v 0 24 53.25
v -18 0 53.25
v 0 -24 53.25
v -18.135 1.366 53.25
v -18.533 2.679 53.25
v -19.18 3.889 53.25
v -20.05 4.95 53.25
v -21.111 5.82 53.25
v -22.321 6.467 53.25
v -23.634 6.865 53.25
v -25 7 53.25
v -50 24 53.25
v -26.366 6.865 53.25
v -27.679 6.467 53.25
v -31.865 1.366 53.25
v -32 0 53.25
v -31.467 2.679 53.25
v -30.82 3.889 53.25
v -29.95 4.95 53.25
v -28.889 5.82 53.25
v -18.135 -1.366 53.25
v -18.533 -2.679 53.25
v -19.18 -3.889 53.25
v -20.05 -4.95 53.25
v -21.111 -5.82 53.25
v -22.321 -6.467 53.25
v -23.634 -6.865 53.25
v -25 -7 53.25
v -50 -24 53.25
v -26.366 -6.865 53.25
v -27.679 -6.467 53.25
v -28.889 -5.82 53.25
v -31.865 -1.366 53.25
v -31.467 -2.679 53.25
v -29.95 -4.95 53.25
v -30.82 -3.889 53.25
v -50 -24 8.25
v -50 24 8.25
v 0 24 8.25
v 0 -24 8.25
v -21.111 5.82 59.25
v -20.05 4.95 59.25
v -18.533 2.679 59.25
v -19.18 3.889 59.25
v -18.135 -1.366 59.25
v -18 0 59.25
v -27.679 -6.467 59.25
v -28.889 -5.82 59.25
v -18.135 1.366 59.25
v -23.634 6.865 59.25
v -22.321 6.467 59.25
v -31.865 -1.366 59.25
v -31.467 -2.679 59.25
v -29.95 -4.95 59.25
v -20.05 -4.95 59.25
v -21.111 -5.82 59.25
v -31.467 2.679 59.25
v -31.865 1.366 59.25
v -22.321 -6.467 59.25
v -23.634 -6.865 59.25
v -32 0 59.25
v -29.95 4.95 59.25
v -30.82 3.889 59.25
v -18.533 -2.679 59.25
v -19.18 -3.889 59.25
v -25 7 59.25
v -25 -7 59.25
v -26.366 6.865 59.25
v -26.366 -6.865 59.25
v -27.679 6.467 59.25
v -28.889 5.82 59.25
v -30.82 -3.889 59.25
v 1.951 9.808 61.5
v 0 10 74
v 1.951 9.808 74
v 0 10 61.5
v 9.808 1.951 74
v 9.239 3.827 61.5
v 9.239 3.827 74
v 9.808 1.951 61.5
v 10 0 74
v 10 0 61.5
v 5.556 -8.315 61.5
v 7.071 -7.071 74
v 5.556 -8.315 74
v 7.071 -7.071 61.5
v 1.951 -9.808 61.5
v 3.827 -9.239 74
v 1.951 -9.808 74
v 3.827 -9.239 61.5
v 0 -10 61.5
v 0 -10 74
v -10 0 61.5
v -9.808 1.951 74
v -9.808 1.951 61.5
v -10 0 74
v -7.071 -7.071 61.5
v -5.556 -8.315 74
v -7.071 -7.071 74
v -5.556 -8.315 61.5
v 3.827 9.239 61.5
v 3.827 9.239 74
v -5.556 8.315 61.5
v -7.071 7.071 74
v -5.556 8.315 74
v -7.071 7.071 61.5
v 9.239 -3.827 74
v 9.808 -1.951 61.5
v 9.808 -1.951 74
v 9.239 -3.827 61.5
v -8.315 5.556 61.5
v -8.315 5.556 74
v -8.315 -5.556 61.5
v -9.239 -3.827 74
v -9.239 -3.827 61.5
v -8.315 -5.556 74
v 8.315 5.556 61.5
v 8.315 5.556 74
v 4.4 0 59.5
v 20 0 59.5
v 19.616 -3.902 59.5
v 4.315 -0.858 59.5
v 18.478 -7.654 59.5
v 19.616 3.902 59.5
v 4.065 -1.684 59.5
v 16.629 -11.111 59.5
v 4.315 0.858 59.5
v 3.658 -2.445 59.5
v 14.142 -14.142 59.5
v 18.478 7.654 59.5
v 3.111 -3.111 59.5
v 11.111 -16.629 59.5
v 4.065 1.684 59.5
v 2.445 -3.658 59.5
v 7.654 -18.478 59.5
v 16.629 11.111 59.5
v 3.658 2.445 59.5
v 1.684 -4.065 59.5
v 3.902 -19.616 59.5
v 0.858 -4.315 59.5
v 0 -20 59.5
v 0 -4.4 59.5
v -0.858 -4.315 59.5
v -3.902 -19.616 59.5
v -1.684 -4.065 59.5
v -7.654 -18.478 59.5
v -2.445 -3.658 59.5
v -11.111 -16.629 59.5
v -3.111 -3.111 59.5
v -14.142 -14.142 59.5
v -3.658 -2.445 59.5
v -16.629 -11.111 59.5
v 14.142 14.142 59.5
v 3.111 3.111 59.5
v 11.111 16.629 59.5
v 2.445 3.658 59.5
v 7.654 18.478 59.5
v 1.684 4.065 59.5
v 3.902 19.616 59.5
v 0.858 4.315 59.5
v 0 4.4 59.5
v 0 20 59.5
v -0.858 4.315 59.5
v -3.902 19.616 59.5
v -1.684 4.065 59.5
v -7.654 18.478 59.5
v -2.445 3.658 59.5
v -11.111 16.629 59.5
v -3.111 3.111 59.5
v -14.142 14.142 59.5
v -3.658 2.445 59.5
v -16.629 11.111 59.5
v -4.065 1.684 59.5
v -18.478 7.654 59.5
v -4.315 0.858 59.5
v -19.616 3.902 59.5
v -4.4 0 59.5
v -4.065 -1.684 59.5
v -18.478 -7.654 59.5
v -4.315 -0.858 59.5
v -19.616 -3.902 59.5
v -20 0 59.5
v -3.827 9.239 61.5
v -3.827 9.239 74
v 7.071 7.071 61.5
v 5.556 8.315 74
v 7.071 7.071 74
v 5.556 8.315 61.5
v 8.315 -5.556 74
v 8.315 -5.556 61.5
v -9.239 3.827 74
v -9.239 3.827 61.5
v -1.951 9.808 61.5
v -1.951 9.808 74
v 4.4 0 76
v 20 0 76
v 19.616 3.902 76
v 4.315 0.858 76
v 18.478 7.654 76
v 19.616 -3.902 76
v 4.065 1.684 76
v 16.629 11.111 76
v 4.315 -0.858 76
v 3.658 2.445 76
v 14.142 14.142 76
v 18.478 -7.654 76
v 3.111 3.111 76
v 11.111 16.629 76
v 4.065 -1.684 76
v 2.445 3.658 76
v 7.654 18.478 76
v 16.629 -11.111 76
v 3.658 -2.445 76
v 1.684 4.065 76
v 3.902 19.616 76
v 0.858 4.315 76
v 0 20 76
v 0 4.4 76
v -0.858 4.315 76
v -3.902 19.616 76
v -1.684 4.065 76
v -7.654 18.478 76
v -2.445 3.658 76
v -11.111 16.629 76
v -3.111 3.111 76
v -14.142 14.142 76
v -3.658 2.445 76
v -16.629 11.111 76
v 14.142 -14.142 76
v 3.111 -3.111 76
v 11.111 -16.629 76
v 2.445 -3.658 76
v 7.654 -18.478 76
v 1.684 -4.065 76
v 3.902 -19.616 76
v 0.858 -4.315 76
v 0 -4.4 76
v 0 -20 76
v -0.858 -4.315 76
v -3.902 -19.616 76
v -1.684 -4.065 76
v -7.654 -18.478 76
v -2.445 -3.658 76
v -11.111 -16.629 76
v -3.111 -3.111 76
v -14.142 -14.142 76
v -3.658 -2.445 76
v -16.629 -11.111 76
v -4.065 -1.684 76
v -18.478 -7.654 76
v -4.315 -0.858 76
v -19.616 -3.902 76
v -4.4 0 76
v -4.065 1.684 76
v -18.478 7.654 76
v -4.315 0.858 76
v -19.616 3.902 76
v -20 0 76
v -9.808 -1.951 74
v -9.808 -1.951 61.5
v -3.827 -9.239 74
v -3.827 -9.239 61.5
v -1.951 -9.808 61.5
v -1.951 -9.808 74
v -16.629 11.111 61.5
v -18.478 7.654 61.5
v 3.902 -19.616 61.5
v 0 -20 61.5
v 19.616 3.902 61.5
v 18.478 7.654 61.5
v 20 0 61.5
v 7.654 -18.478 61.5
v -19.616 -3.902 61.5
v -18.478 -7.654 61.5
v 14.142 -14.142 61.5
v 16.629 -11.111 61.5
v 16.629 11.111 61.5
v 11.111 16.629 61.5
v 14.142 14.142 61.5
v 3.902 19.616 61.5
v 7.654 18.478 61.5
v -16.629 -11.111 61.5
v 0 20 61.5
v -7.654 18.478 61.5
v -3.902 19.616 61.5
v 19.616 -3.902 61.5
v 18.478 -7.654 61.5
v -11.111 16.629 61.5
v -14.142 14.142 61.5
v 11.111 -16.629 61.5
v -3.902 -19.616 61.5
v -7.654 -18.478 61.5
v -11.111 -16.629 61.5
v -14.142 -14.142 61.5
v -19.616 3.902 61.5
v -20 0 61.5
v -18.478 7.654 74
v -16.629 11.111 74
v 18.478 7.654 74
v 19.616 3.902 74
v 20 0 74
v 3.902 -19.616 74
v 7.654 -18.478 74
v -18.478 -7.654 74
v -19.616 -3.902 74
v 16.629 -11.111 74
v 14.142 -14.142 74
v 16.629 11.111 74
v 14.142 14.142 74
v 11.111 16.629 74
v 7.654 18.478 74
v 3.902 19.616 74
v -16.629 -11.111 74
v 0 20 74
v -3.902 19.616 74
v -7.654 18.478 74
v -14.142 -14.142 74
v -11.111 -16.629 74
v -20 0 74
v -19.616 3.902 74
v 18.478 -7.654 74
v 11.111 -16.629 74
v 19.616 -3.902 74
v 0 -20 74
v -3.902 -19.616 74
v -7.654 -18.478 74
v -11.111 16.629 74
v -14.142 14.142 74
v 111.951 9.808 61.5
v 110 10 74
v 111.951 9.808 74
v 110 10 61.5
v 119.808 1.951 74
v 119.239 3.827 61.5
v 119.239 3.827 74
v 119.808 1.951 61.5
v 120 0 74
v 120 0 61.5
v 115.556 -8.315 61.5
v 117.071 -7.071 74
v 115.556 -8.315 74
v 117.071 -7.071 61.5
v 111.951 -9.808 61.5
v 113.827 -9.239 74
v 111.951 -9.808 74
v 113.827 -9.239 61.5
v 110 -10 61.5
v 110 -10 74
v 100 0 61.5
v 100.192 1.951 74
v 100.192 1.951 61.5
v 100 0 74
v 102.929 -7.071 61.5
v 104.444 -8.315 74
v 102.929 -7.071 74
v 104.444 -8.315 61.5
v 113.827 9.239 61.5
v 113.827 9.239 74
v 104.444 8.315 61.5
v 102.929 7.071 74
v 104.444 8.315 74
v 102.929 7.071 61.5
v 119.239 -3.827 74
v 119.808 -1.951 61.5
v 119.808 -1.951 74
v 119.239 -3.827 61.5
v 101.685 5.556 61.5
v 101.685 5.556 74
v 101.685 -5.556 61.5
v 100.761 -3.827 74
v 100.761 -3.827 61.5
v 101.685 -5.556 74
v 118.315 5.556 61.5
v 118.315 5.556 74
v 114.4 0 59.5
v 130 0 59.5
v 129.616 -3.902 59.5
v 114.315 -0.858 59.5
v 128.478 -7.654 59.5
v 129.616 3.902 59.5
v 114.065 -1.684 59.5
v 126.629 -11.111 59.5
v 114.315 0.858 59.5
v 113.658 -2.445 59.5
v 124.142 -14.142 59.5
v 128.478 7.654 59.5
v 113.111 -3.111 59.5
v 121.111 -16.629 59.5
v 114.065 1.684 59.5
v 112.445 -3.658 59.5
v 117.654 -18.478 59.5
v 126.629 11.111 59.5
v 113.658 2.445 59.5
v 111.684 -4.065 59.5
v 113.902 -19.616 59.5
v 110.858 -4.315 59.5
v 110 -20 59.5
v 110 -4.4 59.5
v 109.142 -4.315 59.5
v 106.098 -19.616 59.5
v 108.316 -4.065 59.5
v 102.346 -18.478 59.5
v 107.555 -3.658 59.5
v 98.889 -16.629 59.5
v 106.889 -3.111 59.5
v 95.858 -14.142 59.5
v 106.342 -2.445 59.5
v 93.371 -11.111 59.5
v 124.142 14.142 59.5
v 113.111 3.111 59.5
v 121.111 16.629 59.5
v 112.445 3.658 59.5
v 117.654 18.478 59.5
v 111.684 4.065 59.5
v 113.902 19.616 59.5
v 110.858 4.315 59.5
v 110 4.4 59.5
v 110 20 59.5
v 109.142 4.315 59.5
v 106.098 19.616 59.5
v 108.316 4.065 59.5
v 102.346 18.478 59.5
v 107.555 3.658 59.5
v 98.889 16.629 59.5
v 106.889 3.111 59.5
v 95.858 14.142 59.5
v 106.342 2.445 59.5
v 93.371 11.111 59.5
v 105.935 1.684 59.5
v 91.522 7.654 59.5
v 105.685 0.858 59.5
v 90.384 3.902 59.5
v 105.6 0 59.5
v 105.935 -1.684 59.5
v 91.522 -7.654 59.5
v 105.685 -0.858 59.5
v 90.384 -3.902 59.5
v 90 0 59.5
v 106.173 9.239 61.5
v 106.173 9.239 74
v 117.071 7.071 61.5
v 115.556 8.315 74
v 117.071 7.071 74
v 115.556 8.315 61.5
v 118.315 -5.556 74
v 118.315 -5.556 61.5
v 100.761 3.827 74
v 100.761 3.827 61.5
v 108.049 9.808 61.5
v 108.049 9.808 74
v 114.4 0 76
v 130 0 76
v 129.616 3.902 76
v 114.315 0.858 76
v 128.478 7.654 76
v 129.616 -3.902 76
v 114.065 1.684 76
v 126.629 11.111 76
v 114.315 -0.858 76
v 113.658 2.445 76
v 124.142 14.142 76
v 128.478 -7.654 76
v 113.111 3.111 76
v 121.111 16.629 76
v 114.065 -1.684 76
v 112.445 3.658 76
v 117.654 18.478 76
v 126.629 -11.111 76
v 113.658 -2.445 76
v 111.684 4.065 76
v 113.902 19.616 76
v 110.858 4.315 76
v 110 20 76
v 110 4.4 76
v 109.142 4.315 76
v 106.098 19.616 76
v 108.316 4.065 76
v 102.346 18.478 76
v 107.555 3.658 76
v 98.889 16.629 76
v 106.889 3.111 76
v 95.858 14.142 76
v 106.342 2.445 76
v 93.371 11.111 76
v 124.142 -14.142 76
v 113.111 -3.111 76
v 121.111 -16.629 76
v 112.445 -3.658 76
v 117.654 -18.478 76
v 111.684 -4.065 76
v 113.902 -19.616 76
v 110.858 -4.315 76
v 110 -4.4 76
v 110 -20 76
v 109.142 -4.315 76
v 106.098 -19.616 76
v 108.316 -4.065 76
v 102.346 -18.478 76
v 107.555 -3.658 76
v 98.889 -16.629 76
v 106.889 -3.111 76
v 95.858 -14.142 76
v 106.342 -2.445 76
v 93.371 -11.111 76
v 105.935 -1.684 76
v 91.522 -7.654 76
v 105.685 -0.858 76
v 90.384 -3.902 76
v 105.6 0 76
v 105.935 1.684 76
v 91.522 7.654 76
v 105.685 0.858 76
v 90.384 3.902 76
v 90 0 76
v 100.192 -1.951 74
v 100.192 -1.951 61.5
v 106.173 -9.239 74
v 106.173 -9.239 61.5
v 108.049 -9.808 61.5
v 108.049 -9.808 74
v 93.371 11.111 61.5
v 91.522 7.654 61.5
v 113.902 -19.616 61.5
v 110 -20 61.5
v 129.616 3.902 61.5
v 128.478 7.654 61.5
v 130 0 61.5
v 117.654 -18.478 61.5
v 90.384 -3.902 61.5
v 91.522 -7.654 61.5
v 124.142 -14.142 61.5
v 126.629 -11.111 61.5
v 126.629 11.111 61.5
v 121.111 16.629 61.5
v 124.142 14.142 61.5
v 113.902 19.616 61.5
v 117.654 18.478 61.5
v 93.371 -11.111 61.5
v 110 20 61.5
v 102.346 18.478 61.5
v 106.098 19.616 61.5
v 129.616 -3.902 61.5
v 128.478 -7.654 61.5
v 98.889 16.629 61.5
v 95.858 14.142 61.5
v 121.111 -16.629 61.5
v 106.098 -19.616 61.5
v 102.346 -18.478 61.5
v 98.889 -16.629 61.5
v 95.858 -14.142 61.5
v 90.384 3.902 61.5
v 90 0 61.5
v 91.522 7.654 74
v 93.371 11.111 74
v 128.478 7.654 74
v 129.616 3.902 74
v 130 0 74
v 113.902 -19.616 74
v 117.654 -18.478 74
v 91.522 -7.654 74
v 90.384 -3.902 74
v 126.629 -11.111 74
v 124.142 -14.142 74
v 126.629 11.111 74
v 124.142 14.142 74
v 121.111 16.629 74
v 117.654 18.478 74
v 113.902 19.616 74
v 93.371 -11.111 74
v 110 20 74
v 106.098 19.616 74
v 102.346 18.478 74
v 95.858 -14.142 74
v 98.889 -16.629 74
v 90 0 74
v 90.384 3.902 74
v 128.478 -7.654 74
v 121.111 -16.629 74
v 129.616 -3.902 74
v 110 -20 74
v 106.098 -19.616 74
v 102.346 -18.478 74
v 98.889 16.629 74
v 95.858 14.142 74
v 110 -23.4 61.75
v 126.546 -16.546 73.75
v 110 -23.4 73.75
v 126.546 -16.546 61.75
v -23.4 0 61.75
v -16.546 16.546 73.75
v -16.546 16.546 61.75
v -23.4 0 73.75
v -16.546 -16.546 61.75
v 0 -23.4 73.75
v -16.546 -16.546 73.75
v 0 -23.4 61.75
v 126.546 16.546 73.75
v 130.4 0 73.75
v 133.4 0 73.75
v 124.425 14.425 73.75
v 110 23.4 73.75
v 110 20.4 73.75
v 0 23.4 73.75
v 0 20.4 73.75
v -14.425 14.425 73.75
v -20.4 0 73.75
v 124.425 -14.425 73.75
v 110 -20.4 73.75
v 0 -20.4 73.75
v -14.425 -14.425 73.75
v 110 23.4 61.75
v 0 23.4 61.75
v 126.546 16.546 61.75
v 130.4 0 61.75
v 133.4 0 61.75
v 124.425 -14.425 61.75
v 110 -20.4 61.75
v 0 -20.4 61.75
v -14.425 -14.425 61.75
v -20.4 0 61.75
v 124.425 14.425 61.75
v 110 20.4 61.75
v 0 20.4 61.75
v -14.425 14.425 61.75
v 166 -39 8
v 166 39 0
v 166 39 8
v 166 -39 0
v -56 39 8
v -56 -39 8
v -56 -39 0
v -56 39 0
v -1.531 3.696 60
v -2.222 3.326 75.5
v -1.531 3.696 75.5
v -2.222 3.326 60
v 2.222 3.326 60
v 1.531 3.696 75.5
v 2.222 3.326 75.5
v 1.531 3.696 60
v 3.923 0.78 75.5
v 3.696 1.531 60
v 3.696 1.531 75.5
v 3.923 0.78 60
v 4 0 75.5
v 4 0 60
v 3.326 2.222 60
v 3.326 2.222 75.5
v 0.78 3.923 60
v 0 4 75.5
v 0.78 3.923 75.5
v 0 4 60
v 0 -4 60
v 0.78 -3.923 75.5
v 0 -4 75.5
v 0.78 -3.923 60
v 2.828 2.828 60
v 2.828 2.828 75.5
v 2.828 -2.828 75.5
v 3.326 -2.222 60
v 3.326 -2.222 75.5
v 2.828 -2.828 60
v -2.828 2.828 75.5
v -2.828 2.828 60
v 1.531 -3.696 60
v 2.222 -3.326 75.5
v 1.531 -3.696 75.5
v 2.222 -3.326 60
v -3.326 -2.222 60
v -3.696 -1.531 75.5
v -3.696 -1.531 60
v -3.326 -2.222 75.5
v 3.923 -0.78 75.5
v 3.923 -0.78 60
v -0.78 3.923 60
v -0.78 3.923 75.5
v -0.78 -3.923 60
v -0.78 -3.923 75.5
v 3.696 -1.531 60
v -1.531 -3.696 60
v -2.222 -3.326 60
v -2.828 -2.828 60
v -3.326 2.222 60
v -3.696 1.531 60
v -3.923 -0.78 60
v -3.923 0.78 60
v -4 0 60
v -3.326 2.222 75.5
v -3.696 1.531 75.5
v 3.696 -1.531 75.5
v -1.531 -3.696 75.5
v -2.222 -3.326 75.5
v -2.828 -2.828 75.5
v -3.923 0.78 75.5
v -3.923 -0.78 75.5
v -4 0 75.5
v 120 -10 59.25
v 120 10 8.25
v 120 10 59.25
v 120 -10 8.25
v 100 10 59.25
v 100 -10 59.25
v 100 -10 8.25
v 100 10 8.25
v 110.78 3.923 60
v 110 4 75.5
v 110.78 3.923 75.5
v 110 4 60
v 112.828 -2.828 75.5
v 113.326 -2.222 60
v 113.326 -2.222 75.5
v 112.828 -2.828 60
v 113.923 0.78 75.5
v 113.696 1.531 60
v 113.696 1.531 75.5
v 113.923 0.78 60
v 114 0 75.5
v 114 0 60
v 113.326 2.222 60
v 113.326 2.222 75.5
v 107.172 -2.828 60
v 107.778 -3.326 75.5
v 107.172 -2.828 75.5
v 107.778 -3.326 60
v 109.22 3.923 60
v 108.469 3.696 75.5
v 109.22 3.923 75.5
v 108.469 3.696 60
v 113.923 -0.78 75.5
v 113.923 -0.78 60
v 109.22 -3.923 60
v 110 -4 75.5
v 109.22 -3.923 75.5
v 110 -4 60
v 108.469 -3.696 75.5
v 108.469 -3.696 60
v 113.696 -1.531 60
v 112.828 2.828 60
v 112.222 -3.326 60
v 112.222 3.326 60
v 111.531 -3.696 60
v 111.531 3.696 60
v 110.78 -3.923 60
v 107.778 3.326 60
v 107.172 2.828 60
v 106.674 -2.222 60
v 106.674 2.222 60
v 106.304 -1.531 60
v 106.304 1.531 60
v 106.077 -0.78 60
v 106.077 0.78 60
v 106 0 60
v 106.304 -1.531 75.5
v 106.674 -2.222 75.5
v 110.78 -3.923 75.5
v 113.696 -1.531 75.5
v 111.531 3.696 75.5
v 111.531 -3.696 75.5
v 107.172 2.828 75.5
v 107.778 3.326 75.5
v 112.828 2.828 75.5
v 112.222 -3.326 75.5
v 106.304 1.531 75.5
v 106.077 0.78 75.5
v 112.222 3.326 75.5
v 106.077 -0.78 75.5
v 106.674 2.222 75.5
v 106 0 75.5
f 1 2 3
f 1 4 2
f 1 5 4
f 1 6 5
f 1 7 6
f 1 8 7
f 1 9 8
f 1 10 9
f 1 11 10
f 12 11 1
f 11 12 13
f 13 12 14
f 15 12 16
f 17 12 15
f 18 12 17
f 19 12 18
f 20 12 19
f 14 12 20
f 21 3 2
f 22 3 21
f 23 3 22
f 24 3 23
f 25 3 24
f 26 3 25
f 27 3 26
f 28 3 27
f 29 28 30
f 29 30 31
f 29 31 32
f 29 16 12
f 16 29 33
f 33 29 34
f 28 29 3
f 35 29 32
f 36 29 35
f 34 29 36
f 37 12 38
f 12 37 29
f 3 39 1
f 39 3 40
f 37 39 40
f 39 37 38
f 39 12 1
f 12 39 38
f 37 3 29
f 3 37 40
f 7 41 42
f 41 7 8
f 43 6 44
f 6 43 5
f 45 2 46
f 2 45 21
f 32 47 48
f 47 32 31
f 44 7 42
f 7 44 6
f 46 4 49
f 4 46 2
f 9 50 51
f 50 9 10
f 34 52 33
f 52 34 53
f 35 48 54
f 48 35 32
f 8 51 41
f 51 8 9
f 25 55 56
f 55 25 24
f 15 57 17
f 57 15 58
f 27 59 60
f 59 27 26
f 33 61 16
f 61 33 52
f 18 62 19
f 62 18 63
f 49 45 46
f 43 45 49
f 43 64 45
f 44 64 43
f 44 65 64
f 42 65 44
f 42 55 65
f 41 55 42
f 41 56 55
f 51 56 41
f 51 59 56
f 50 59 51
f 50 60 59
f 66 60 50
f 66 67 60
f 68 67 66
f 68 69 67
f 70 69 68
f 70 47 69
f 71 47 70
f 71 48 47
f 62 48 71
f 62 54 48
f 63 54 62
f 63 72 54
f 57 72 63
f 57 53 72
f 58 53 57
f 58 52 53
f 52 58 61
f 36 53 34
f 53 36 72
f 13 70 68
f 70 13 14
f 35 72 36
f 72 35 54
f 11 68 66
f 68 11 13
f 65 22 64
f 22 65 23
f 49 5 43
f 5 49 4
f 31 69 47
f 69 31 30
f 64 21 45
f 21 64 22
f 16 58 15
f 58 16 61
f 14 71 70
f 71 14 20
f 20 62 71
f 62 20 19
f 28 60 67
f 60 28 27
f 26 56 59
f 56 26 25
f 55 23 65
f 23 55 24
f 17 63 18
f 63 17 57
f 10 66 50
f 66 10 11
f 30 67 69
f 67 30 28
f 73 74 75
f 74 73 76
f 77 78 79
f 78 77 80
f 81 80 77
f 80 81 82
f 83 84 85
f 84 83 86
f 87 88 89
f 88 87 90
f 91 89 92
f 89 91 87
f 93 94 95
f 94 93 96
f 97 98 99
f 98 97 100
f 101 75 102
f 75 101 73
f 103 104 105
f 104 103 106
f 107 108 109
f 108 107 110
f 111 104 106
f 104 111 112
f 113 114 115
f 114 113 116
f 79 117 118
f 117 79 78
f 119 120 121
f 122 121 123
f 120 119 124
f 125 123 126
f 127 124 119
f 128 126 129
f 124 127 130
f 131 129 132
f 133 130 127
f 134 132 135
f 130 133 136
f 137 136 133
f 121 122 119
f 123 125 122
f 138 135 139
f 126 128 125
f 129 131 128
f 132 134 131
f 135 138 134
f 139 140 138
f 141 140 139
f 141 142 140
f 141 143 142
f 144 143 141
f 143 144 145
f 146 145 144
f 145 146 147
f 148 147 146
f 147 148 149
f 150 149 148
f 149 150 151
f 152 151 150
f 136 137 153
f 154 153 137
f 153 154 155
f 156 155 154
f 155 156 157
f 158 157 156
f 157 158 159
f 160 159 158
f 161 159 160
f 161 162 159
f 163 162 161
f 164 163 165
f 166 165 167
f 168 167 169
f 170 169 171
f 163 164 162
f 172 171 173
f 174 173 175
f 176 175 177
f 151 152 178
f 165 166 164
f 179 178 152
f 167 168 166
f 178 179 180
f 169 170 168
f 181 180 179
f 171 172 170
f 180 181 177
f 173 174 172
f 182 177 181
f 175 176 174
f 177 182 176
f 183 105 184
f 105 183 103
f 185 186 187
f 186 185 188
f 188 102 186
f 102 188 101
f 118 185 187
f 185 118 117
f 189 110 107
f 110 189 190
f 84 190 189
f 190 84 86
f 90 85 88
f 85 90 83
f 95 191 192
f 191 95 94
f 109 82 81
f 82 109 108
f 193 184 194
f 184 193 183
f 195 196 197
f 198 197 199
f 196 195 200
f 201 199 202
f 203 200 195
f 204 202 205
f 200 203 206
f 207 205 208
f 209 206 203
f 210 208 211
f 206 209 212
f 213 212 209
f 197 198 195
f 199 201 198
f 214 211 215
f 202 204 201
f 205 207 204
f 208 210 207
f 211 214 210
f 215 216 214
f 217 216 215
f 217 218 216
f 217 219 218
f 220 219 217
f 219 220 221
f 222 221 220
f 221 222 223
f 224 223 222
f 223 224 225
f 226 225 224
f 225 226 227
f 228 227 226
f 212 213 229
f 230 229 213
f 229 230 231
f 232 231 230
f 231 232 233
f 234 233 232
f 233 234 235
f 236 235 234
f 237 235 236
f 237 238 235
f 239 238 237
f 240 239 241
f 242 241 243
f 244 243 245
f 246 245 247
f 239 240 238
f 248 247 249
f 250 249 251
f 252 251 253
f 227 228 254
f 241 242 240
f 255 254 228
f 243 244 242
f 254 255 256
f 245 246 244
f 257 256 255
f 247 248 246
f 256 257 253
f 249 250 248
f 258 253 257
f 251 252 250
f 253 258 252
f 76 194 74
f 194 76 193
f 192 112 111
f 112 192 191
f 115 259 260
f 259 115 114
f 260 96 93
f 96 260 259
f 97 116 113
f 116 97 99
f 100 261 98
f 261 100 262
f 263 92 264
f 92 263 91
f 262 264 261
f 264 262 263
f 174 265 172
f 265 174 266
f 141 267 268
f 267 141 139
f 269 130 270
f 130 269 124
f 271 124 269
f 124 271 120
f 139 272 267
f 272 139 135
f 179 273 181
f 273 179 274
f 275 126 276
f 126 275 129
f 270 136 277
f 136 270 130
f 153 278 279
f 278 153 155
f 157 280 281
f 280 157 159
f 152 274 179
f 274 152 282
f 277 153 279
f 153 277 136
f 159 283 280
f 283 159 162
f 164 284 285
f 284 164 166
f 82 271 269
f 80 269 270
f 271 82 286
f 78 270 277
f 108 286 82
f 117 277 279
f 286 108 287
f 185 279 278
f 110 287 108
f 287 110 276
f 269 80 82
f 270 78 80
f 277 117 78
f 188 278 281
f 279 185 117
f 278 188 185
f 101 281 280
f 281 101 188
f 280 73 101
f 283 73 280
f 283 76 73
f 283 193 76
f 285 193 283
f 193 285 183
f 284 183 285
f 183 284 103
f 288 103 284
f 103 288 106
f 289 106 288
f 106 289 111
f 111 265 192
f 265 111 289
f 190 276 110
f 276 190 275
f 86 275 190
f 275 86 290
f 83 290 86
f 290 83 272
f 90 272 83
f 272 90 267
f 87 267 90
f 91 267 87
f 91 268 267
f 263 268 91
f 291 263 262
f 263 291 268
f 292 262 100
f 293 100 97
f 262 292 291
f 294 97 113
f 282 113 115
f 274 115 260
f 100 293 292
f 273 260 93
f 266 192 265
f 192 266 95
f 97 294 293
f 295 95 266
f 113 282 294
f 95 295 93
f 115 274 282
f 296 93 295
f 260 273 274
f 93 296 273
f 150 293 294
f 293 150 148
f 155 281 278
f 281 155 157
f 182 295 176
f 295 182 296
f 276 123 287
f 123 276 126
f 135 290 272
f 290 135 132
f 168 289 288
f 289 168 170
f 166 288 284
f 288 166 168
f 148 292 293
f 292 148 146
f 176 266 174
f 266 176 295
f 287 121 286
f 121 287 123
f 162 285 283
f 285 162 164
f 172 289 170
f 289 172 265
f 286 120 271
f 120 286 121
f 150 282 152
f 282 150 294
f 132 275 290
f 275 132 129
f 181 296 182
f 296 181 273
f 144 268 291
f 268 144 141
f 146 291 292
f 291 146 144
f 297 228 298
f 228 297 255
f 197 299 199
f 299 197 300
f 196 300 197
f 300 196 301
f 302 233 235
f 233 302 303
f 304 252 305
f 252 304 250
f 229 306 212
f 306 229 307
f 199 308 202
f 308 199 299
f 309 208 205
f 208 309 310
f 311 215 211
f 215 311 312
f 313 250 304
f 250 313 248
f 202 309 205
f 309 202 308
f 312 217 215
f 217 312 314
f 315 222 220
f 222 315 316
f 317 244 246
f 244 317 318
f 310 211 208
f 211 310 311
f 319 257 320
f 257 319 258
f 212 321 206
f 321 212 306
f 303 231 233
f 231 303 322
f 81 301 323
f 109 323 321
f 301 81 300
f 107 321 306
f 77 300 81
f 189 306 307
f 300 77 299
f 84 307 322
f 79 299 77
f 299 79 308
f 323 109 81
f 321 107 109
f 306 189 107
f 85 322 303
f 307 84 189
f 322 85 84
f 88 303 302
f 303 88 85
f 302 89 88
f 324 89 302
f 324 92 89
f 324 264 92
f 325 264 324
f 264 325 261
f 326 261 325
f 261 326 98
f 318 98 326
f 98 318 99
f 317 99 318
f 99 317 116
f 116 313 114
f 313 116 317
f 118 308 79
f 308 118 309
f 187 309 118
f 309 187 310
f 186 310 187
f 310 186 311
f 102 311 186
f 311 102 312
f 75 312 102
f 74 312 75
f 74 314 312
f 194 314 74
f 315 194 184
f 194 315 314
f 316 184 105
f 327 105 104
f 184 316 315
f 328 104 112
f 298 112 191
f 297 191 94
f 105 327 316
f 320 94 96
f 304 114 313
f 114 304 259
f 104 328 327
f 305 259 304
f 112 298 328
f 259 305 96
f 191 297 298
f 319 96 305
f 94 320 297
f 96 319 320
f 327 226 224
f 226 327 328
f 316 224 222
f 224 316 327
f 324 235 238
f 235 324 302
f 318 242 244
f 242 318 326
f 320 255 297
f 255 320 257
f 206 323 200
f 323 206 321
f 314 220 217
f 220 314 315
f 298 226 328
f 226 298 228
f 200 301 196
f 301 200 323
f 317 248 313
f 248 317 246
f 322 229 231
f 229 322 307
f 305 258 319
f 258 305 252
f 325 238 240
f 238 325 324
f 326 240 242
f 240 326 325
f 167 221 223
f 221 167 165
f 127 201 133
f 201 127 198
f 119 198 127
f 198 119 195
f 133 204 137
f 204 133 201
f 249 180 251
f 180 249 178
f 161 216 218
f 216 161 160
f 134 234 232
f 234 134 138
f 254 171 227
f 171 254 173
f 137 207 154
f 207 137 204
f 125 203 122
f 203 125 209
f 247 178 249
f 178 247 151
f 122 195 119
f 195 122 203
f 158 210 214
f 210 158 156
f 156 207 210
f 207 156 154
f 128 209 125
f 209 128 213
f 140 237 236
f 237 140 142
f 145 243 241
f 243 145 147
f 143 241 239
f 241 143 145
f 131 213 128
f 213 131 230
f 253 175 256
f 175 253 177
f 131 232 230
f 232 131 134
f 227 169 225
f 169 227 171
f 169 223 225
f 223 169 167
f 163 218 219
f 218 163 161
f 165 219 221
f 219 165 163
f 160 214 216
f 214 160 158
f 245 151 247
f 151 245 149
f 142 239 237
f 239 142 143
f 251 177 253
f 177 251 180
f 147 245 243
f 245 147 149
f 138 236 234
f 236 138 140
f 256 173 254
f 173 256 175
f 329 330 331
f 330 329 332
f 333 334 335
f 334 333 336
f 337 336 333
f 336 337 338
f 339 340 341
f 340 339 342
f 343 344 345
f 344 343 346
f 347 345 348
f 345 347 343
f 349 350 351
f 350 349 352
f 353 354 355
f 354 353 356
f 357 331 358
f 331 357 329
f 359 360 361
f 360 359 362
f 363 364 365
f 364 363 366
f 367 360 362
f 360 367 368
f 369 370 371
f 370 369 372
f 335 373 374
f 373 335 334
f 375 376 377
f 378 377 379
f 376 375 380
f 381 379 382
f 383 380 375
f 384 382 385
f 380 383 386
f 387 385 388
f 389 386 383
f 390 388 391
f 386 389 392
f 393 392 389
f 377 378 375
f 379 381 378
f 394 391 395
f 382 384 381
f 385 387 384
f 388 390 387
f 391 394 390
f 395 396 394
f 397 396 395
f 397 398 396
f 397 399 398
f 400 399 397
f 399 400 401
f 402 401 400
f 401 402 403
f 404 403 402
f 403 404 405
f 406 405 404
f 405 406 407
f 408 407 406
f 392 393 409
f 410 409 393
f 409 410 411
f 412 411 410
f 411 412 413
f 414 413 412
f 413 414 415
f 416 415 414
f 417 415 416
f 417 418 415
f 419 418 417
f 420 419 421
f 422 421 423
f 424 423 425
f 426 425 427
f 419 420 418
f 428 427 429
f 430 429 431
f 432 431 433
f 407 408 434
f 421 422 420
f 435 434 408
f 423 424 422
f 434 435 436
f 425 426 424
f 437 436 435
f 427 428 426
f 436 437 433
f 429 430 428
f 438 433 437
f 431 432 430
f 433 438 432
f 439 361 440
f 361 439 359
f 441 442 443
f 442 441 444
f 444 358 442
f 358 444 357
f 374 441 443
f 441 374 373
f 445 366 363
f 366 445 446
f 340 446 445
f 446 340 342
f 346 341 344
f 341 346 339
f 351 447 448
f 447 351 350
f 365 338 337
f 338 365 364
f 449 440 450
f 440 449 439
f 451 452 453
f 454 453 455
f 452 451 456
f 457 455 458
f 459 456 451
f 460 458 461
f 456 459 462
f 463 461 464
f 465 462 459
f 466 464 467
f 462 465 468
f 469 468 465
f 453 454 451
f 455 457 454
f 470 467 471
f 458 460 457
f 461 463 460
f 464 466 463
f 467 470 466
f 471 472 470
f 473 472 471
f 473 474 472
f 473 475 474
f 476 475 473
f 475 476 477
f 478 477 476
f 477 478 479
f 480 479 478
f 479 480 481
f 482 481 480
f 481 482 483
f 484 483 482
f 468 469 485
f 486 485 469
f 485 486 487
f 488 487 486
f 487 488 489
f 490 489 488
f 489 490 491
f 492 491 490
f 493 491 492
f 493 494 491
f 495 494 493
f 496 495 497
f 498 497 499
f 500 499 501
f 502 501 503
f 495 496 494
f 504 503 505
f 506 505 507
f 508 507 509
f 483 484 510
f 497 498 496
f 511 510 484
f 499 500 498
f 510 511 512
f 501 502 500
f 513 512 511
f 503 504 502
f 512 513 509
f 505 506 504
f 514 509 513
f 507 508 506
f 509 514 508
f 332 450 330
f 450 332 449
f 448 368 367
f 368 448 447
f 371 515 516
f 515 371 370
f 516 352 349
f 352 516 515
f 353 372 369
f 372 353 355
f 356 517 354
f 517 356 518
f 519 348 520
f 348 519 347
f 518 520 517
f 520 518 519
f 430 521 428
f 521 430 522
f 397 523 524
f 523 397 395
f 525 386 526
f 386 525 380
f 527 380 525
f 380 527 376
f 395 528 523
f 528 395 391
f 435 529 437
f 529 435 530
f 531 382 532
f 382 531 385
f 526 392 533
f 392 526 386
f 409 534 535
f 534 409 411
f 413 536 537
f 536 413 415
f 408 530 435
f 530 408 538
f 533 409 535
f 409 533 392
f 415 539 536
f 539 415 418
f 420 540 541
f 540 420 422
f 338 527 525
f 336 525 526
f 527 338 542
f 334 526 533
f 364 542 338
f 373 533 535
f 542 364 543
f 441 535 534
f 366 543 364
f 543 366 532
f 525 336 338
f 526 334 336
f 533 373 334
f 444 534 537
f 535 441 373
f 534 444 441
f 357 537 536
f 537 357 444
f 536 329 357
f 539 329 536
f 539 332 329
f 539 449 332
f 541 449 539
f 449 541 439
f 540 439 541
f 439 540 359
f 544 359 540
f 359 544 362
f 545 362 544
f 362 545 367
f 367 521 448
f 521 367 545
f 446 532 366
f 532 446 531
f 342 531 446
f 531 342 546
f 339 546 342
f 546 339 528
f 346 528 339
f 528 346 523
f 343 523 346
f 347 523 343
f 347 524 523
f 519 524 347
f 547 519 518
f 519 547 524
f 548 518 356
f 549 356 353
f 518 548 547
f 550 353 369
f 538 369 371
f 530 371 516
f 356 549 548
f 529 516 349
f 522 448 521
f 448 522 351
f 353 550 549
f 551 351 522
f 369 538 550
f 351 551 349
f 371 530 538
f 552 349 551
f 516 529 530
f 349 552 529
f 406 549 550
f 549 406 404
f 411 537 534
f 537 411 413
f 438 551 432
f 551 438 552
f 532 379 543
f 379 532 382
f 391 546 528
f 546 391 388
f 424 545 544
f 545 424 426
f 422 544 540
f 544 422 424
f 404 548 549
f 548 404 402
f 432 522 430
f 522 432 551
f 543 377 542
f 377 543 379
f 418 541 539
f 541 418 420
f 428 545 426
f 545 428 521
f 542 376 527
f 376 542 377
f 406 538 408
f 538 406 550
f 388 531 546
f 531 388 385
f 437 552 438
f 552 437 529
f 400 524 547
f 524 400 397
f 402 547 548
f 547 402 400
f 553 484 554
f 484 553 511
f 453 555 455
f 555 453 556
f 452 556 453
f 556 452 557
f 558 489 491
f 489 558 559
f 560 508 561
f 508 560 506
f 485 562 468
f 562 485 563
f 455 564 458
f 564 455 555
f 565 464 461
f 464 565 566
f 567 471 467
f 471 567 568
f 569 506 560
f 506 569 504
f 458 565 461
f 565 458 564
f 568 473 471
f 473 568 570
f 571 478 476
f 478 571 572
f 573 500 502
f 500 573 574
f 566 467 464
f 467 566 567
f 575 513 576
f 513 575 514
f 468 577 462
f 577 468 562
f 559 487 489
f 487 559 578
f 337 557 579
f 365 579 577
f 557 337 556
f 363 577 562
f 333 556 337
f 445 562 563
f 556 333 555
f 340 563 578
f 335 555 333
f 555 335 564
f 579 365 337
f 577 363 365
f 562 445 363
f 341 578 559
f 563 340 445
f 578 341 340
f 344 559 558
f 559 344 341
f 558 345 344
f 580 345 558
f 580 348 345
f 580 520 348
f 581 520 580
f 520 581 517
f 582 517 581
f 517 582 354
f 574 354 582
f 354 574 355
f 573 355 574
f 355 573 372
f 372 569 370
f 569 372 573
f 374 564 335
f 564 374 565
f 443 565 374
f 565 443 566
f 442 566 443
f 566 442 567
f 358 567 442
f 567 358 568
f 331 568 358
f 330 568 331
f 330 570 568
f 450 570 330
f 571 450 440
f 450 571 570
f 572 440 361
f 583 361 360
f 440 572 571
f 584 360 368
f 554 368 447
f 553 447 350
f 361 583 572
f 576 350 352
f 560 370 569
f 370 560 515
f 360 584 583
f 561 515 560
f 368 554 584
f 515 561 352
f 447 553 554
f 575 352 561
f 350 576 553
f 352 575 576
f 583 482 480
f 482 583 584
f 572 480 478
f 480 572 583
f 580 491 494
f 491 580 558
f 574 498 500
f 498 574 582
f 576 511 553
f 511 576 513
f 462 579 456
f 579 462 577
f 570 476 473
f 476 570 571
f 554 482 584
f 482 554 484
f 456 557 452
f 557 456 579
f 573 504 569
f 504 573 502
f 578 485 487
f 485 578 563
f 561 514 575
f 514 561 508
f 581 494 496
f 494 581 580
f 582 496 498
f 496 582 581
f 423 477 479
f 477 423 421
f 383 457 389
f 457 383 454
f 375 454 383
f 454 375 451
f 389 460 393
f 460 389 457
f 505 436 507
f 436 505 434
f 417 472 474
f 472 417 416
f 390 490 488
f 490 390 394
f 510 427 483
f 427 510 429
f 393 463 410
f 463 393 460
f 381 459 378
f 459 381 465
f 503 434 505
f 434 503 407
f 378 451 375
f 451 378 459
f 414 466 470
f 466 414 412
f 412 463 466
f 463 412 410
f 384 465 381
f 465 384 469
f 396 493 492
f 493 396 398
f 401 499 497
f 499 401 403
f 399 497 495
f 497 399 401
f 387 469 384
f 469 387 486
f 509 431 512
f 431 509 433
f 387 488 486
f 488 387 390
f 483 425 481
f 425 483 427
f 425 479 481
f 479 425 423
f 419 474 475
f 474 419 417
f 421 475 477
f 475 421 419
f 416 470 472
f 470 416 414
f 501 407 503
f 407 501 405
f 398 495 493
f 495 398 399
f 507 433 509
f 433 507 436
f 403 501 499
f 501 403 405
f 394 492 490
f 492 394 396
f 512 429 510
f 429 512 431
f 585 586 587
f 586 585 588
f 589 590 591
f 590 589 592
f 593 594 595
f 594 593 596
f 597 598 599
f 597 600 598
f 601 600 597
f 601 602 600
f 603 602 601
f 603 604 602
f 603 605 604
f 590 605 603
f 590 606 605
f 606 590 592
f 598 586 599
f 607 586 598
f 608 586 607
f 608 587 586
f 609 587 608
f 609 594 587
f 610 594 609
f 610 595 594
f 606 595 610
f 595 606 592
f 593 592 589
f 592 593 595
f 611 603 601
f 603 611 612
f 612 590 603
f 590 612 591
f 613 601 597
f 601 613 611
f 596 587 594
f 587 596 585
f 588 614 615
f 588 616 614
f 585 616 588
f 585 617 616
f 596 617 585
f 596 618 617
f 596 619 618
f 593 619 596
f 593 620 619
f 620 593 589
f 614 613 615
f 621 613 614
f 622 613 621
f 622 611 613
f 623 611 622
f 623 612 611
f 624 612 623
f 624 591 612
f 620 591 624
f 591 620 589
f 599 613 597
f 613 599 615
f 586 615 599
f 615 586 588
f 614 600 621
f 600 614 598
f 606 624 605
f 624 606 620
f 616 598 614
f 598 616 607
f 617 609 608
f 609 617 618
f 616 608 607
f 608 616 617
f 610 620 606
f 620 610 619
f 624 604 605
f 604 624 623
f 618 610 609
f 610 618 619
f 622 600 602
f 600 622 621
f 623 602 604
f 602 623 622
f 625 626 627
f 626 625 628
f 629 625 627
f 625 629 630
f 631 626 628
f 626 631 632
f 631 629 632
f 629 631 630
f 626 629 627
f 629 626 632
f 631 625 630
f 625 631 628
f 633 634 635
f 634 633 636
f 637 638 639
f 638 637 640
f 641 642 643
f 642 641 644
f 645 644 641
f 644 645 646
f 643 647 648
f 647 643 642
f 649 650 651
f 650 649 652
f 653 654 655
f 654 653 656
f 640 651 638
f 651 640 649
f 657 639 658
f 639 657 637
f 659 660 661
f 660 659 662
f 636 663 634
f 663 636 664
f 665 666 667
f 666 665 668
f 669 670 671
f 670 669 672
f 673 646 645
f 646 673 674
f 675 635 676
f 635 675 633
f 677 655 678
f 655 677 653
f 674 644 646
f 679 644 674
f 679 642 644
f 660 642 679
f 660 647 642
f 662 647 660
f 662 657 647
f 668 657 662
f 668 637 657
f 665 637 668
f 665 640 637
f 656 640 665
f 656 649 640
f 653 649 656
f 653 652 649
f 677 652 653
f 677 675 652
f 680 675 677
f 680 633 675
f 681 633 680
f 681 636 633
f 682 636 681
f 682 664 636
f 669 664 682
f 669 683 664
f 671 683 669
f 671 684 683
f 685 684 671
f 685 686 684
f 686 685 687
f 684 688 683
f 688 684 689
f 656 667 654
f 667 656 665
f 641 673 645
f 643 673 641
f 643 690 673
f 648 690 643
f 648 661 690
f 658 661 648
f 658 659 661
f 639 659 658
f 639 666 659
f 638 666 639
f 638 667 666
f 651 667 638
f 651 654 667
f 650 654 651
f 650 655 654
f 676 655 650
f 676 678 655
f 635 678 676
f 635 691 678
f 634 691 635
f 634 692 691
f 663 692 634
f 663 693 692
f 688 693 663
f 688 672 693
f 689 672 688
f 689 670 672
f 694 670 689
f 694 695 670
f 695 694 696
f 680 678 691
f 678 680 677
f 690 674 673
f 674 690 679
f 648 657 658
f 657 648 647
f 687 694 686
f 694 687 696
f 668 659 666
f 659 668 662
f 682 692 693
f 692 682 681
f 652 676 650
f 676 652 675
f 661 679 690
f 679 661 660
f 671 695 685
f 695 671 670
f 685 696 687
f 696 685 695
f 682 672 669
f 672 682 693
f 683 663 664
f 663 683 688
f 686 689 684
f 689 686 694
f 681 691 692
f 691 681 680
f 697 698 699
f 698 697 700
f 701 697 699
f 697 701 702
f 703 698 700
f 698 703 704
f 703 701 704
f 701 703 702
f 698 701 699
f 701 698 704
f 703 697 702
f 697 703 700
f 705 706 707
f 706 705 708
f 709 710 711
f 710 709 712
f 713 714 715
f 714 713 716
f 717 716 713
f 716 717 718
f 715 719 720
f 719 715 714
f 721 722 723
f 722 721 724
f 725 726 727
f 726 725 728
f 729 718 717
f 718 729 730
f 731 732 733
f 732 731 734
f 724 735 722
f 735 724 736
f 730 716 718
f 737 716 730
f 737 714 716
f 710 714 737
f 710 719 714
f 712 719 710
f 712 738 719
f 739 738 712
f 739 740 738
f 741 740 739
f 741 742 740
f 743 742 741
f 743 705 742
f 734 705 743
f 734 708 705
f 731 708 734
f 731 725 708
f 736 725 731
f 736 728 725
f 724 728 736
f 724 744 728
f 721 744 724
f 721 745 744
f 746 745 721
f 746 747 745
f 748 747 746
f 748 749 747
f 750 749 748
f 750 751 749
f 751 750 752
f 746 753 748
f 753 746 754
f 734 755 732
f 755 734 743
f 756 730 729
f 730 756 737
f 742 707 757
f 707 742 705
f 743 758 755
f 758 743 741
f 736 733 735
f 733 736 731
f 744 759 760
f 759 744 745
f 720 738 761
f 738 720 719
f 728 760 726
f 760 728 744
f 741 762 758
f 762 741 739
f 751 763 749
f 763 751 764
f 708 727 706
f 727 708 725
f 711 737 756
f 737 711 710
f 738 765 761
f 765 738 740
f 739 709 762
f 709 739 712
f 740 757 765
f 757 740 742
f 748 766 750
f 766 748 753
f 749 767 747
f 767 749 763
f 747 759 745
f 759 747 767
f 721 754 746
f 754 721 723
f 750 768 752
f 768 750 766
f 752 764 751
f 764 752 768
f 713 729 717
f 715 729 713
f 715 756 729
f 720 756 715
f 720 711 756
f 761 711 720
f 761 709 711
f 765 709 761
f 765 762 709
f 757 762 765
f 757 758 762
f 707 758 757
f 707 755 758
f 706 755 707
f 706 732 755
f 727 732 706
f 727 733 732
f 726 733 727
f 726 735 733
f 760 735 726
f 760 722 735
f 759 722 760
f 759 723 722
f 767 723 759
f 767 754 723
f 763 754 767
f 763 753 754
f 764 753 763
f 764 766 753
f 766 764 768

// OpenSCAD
$fn = 32;

// ------------------------------------------------------------------------
// Motor belt drive: span 110 mm, pulleys d40, belt 12 mm wide
// Every part is its own module, assembly() places every instance.
// ------------------------------------------------------------------------

// --- part 1 ---
module base_plate() {
  difference() {
    translate([-111, -39, 0]) cube([222, 78, 8]);
  }
}

// --- part 2 ---
module motor() {
  union() {
    translate([-22.5, -24, 0]) cube([45, 48, 50]);
    translate([25.5, 0, 25]) rotate([0, 90, 0]) cylinder(h = 6, d = 14, center = true);
  }
}

// --- part 3 ---
module drive_shaft() {
  translate([0, 0, -7.75]) cylinder(h = 15.5, d = 8);
}

// --- part 4 ---
module pulley_drive() {
  difference() {
    union() {
      cylinder(h = 16.5, d = 20);
      cylinder(h = 2, d = 40);
      translate([0, 0, 14.5]) cylinder(h = 2, d = 40);
    }
    translate([0, 0, -1]) cylinder(h = 18.5, d = 8.8);
  }
}

// --- part 5 ---
module idler_post() {
  translate([-10, -10, 0]) cube([20, 20, 51]);
}

// --- part 6 ---
module driven_shaft() {
  translate([0, 0, -7.75]) cylinder(h = 15.5, d = 8);
}

// --- part 7 ---
module pulley_driven() {
  difference() {
    union() {
      cylinder(h = 16.5, d = 20);
      cylinder(h = 2, d = 40);
      translate([0, 0, 14.5]) cylinder(h = 2, d = 40);
    }
    translate([0, 0, -1]) cylinder(h = 18.5, d = 8.8);
  }
}

// --- part 8 ---
module drive_belt() {
  difference() {
    linear_extrude(height = 12) polygon(points = concat([for (a = [90 : 45 : 270]) [23.4 * cos(a), 23.4 * sin(a)]], [for (a = [270 : 45 : 450]) [110 + 23.4 * cos(a), 23.4 * sin(a)]]));
    translate([0, 0, -1]) linear_extrude(height = 14) polygon(points = concat([for (a = [90 : 45 : 270]) [20.4 * cos(a), 20.4 * sin(a)]], [for (a = [270 : 45 : 450]) [110 + 20.4 * cos(a), 20.4 * sin(a)]]));
  }
}

// --- assembly ---
module assembly() {
  color([0.80, 0.24, 0.20]) translate([55, 0, 0]) rotate([0, 0, 0]) base_plate();
  color([0.20, 0.45, 0.75]) translate([0, 0, 30.75]) rotate([0, 270, 0]) motor();
  color([0.25, 0.62, 0.32]) translate([0, 0, 67.75]) rotate([0, 0, 0]) drive_shaft();
  color([0.92, 0.70, 0.18]) translate([0, 0, 59.5]) rotate([0, 0, 0]) pulley_drive();
  color([0.58, 0.35, 0.70]) translate([110, 0, 8.25]) rotate([0, 0, 0]) idler_post();
  color([0.16, 0.66, 0.66]) translate([110, 0, 67.75]) rotate([0, 0, 0]) driven_shaft();
  color([0.85, 0.48, 0.18]) translate([110, 0, 59.5]) rotate([0, 0, 0]) pulley_driven();
  color([0.55, 0.60, 0.65]) translate([0, 0, 61.75]) rotate([0, 0, 0]) drive_belt();
}

assembly();
